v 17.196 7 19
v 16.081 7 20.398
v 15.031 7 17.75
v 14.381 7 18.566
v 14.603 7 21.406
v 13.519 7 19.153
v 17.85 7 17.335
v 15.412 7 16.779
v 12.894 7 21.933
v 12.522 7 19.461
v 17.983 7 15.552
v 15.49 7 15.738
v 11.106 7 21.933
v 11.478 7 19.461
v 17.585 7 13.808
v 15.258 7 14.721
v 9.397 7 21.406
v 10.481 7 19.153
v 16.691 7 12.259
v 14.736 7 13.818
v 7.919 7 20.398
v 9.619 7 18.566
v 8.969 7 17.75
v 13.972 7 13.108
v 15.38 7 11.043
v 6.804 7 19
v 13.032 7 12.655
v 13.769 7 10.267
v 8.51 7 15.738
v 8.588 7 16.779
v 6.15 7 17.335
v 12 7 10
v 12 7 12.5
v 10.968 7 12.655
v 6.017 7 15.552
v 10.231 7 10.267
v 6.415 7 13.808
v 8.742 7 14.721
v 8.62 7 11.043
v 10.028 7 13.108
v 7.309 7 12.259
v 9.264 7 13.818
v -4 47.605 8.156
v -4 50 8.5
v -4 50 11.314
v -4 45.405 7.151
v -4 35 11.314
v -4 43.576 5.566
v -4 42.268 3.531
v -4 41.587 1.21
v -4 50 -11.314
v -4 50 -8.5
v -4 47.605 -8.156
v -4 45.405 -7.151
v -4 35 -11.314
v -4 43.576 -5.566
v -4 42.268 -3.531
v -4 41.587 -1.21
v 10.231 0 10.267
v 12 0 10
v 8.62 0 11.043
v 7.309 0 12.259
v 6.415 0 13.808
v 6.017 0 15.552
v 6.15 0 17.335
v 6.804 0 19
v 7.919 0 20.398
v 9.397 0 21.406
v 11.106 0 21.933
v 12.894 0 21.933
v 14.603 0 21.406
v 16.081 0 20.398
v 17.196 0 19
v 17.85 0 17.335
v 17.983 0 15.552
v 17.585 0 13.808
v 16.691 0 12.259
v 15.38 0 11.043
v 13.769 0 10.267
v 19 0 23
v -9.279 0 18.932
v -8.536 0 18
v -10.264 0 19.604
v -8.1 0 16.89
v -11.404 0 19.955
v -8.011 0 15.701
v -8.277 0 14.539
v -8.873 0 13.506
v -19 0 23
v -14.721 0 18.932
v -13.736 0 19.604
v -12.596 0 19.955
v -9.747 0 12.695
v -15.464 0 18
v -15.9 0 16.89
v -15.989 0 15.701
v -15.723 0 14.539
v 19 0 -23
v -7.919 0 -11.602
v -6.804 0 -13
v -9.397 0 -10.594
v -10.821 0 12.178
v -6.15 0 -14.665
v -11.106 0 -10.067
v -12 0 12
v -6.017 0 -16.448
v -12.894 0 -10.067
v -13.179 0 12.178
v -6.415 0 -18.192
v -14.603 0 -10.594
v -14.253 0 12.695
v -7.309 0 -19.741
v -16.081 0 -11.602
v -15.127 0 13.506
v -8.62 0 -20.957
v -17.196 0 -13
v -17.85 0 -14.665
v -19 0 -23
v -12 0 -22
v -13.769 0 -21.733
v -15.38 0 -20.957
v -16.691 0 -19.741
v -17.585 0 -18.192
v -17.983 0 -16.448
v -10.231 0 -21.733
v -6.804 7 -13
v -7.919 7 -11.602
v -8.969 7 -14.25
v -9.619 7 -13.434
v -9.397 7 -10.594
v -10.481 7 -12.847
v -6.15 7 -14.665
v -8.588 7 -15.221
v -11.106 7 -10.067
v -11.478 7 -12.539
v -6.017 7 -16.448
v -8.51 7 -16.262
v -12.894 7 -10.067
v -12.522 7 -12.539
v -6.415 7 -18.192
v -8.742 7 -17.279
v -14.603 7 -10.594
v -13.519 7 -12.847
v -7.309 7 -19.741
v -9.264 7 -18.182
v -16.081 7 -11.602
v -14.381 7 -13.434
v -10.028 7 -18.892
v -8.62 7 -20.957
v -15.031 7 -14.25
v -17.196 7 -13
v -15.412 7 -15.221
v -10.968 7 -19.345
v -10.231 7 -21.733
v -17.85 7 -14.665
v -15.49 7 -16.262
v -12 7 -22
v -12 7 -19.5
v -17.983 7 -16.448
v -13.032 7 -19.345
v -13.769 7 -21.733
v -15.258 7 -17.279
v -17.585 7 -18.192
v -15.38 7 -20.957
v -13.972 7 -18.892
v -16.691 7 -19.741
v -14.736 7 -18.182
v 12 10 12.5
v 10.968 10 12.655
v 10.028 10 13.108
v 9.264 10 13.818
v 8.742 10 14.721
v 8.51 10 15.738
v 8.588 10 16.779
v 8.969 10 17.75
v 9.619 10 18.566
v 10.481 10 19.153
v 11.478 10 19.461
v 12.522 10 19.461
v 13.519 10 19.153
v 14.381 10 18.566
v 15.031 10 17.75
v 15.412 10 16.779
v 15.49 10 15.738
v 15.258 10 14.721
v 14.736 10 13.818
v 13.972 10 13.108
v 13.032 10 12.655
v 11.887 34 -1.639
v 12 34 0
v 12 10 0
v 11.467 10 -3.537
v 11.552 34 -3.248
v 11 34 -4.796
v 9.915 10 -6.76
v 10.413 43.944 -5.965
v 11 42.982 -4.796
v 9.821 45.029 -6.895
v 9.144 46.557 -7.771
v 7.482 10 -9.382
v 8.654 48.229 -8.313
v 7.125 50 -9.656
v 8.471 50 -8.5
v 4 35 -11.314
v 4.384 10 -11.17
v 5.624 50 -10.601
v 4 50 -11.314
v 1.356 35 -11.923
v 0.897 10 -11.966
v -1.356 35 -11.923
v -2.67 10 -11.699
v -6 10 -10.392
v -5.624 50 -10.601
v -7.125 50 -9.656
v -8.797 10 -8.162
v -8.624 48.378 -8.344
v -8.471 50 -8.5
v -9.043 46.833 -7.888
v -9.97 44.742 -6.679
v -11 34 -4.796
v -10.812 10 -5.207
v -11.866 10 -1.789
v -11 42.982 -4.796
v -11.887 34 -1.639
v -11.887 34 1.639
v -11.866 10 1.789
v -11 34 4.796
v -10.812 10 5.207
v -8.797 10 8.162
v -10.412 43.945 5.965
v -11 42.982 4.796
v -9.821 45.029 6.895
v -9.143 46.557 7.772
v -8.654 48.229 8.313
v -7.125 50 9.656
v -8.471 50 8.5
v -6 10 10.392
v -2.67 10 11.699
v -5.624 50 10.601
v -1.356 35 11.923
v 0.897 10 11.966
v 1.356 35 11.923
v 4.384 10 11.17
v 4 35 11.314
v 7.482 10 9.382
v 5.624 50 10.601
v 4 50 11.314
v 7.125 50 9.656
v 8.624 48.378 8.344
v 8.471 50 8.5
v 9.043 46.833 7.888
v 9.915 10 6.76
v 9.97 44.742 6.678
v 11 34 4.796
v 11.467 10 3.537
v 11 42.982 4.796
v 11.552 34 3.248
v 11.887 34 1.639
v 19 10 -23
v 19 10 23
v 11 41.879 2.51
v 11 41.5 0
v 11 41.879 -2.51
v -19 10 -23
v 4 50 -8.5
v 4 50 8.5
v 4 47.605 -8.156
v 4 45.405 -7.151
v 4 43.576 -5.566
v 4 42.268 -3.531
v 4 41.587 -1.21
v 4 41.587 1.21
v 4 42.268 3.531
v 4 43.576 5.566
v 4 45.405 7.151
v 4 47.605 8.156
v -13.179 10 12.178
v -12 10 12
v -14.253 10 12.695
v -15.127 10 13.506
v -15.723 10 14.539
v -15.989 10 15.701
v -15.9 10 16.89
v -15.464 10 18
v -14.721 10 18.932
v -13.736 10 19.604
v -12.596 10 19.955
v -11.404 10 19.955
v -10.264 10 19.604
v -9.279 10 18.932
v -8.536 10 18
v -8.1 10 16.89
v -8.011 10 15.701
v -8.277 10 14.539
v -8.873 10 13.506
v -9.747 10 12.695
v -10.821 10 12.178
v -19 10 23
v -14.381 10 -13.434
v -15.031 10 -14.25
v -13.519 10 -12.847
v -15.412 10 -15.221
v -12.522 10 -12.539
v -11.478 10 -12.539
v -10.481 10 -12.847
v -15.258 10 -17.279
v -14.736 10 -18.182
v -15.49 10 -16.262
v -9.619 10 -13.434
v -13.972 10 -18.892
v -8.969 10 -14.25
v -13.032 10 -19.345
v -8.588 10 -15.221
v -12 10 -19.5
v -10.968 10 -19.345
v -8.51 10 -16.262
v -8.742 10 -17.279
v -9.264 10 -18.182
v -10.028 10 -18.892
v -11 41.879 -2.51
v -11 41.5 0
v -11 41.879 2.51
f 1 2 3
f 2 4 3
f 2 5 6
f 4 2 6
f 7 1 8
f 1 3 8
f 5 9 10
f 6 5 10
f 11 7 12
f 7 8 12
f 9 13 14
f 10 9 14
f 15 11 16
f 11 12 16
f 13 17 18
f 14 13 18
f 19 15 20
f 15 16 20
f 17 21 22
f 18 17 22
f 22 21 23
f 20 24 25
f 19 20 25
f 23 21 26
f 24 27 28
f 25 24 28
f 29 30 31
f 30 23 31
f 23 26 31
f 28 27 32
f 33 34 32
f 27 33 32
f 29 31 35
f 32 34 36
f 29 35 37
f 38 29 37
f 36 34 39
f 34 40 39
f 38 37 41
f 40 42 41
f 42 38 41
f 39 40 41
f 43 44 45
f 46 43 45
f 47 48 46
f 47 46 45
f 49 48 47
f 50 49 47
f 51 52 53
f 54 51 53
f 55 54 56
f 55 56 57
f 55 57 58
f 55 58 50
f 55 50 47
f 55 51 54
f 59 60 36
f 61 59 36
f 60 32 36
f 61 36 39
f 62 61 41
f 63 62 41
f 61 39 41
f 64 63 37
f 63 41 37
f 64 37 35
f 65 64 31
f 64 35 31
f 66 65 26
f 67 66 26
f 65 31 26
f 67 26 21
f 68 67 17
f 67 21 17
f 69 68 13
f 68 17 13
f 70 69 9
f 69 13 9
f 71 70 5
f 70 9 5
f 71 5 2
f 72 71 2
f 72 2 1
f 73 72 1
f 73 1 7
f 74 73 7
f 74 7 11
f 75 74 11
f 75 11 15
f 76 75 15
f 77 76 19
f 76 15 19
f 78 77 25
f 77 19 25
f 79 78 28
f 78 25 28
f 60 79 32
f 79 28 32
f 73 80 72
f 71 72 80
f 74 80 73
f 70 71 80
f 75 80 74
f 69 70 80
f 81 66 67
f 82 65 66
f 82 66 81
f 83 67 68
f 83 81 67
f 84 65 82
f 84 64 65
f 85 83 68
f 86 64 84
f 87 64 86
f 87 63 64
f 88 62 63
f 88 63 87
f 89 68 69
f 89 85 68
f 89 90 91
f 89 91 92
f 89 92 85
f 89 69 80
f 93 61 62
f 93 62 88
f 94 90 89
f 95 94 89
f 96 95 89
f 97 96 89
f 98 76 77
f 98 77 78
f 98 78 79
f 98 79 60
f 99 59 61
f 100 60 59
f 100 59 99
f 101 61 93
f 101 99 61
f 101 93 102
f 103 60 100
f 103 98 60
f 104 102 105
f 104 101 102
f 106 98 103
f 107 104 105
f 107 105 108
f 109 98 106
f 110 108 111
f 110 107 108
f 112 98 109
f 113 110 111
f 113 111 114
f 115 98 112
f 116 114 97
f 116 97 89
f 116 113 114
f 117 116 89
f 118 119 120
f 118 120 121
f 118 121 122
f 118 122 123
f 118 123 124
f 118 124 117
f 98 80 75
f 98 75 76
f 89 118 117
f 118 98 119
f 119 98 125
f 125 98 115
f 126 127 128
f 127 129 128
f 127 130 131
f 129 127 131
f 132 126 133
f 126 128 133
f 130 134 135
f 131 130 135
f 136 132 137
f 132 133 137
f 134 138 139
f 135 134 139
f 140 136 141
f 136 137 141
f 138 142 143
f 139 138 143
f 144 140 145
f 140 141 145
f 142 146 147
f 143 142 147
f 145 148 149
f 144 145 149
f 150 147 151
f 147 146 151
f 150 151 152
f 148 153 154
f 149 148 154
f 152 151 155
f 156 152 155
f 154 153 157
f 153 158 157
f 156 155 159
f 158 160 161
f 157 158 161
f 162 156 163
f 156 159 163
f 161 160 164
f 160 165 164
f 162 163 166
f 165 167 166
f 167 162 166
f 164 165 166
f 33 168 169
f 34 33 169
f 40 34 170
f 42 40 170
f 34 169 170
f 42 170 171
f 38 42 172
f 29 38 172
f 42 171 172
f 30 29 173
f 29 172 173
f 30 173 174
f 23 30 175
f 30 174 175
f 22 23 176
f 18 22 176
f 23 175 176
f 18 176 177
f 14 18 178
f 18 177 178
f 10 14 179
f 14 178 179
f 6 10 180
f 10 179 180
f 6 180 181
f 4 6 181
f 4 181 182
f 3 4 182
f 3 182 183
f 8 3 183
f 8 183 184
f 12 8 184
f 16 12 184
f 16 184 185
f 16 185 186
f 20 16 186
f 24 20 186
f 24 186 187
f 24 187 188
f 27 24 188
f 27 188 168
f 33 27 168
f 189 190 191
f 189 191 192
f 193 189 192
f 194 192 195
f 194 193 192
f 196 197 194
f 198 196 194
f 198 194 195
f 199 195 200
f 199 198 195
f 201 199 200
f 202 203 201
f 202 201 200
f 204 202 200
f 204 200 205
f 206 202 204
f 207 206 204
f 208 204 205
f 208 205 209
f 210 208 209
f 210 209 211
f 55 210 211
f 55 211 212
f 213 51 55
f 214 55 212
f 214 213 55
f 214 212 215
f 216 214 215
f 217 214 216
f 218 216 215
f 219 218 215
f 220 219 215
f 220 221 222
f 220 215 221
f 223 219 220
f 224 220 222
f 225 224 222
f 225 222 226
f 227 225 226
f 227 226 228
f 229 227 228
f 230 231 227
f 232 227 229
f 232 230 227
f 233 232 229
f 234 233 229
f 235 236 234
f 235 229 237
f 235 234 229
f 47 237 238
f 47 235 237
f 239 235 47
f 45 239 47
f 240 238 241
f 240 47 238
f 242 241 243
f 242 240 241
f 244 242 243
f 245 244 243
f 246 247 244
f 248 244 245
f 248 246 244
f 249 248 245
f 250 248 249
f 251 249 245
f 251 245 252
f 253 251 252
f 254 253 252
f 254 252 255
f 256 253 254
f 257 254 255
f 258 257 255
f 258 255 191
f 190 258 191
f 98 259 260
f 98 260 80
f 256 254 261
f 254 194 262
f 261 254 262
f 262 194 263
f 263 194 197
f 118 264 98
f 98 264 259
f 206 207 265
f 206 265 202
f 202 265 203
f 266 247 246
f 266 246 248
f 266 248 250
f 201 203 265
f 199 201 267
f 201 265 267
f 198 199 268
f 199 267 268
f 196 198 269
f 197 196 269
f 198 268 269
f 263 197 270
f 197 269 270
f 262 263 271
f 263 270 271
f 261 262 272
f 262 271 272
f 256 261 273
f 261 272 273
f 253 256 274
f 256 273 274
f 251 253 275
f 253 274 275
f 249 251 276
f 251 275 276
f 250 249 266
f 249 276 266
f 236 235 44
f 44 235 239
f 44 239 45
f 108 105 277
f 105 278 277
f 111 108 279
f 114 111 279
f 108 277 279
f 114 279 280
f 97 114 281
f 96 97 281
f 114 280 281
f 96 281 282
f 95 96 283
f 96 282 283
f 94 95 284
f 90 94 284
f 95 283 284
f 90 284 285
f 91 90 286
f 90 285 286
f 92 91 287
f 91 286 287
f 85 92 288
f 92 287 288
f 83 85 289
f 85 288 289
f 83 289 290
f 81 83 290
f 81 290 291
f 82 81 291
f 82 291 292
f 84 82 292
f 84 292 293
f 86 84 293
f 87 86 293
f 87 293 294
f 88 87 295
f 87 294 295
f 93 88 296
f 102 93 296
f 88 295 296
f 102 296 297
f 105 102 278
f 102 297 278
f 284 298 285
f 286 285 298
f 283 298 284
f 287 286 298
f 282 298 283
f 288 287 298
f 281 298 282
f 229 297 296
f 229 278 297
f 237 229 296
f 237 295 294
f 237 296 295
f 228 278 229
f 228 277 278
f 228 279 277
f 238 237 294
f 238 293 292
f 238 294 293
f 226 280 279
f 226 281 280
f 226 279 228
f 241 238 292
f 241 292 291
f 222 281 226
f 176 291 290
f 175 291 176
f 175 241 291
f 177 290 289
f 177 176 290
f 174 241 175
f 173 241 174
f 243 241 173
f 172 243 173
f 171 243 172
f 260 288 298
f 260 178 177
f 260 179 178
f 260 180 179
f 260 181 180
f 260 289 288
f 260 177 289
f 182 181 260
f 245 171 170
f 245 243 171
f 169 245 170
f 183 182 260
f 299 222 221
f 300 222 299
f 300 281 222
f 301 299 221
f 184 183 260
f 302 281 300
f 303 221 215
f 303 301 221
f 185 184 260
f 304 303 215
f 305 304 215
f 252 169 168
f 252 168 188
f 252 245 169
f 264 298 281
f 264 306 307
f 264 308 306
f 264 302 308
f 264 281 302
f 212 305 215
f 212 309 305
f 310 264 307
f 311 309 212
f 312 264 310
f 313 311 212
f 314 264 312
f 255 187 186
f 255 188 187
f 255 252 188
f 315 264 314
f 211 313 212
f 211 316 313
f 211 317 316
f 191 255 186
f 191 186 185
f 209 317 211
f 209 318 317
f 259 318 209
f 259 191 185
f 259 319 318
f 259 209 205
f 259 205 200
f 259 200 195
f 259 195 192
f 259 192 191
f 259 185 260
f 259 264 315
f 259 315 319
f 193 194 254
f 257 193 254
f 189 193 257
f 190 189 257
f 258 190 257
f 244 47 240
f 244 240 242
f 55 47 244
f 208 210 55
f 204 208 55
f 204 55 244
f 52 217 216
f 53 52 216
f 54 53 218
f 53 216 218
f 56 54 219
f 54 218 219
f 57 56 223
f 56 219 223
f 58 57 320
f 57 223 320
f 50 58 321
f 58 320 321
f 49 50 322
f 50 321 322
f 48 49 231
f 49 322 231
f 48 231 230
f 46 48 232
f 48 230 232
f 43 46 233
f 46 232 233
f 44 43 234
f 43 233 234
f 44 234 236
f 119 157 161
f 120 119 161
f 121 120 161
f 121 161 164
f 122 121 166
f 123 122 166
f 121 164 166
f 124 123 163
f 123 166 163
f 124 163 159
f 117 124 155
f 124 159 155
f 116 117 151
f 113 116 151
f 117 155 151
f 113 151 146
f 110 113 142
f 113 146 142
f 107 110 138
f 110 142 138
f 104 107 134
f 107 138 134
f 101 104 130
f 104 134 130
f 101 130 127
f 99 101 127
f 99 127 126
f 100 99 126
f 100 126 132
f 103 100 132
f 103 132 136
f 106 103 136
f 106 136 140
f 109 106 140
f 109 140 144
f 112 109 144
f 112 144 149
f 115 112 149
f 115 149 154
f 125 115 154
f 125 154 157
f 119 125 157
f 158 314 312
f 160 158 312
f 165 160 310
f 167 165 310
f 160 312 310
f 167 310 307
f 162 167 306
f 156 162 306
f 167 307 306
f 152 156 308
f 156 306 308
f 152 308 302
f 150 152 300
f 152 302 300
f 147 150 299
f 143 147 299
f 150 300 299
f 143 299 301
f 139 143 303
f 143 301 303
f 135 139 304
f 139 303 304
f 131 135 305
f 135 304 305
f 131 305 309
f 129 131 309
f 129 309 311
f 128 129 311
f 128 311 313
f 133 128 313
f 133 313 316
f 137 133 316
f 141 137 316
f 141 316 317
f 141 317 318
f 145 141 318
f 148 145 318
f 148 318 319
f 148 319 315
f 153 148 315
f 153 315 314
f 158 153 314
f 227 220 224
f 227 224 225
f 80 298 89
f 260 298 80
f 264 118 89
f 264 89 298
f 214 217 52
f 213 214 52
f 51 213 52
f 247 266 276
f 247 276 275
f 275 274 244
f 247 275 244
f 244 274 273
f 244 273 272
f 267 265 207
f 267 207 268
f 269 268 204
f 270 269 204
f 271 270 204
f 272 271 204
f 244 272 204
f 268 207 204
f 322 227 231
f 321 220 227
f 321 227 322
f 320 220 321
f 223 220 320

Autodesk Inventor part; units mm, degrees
ref_plane "YZ Plane" through (0, 0, 0) normal (1, 0, 0) x (0, 1, 0)
ref_plane "XZ Plane" through (0, 0, 0) normal (0, 1, 0) x (-1, 0, 0)
ref_plane "XY Plane" through (0, 0, 0) normal (0, 0, 1) x (1, 0, 0)
sketch "Эскиз1" plane through (0, 0, 0) normal (0, 0, 1) x (1, 0, 0)
  line L0 (-19, 10) -> (19, 10)
  line L1 (19, 10) -> (19, 0)
  line L2 (19, 0) -> (-19, 0)
  line L3 (-19, 0) -> (-19, 10)
  line L4 (12, 10) -> (12, 34)
  line L5 (12, 34) -> (11, 34)
  line L6 (11, 34) -> (11, 50)
  line L7 (11, 50) -> (4, 50)
  line L8 (4, 50) -> (4, 35)
  line L9 (4, 35) -> (0, 35)
  line L10 (0, 35) -> (0, 10)
  line L11 (12, 34) -> (12, 50)
  line L12 (12, 50) -> (11, 50)
  line L13 (4, 50) -> (-4, 50)
  line L14 (-4, 50) -> (-4, 35)
  line L15 (-4, 35) -> (0, 35)
  line L16 (-12, 34) -> (-11, 34)
  line L17 (-11, 34) -> (-11, 50)
  line L18 (-12, 34) -> (-12, 50)
  line L19 (-12, 50) -> (-11, 50)
  point P0 (0, 0)
  point P1 (0, 0)
  dimension "d0" = 38
  dimension "d1" = 50
  dimension "d2" = 40
  dimension "d3" = 16
  dimension "d4" = 15
  dimension "d5" = 22
  dimension "d6" = 4
  dimension "d7" = 24
  dimension "d13" = 8
extrude "Выдавливание1" add sketch "Эскиз1" along normal mid plane 46 contours L0 L1 L2 L3
revolve "Вращение1" add sketch "Эскиз1" angle 360 about axis through (0, 35, 0) along (0, -1, 0) contours L10 L9 L8 L7 L6 L5 L4 L0 | L5 L6 L12 L11
extrude "Выдавливание2" cut sketch "Эскиз1" along normal through all both and the other way through all contours L15 L14 L13 L8 L9 | L5 L6 L12 L11 | L18 L19 L17 L16
sketch "Эскиз2" plane through (-11, 34, 4.7958) normal (-1, 0, 0) x (0, 0, 1)
  arc A0 (-13.2958, 16) -> (3.7042, 16) centre (-4.7958, 16) ccw
  line L0 (-13.2958, 16) -> (3.7042, 16)
  line L1 (6.5179, 16) -> (-16.1095, 16) projected
  point P0 (-4.7958, 16)
  dimension "d16" = 8.5
extrude "Выдавливание4" cut sketch "Эскиз2" against normal through all
sketch "Эскиз3" plane through (-19, 0, 23) normal (0, -1, 0) x (1, 0, 0)
  point P0 (19, -23)
  point P1 (7, -7)
  point P2 (7, -39)
  point P3 (31, -7)
  dimension "d19" = 12
  dimension "d21" = 16
  dimension "d22" = 32
  dimension "d30" = 24
hole "Отверстие1" at (-12, 0, 16) direction (0, 1, 0) diameter 8 end through all
hole "Отверстие2" at (12, 0, 16) at (-12, 0, -16) direction (0, 1, 0) diameter 7 end through all counterbore diameter 12 counterbore depth 7
properties part number "Фиксатор"
